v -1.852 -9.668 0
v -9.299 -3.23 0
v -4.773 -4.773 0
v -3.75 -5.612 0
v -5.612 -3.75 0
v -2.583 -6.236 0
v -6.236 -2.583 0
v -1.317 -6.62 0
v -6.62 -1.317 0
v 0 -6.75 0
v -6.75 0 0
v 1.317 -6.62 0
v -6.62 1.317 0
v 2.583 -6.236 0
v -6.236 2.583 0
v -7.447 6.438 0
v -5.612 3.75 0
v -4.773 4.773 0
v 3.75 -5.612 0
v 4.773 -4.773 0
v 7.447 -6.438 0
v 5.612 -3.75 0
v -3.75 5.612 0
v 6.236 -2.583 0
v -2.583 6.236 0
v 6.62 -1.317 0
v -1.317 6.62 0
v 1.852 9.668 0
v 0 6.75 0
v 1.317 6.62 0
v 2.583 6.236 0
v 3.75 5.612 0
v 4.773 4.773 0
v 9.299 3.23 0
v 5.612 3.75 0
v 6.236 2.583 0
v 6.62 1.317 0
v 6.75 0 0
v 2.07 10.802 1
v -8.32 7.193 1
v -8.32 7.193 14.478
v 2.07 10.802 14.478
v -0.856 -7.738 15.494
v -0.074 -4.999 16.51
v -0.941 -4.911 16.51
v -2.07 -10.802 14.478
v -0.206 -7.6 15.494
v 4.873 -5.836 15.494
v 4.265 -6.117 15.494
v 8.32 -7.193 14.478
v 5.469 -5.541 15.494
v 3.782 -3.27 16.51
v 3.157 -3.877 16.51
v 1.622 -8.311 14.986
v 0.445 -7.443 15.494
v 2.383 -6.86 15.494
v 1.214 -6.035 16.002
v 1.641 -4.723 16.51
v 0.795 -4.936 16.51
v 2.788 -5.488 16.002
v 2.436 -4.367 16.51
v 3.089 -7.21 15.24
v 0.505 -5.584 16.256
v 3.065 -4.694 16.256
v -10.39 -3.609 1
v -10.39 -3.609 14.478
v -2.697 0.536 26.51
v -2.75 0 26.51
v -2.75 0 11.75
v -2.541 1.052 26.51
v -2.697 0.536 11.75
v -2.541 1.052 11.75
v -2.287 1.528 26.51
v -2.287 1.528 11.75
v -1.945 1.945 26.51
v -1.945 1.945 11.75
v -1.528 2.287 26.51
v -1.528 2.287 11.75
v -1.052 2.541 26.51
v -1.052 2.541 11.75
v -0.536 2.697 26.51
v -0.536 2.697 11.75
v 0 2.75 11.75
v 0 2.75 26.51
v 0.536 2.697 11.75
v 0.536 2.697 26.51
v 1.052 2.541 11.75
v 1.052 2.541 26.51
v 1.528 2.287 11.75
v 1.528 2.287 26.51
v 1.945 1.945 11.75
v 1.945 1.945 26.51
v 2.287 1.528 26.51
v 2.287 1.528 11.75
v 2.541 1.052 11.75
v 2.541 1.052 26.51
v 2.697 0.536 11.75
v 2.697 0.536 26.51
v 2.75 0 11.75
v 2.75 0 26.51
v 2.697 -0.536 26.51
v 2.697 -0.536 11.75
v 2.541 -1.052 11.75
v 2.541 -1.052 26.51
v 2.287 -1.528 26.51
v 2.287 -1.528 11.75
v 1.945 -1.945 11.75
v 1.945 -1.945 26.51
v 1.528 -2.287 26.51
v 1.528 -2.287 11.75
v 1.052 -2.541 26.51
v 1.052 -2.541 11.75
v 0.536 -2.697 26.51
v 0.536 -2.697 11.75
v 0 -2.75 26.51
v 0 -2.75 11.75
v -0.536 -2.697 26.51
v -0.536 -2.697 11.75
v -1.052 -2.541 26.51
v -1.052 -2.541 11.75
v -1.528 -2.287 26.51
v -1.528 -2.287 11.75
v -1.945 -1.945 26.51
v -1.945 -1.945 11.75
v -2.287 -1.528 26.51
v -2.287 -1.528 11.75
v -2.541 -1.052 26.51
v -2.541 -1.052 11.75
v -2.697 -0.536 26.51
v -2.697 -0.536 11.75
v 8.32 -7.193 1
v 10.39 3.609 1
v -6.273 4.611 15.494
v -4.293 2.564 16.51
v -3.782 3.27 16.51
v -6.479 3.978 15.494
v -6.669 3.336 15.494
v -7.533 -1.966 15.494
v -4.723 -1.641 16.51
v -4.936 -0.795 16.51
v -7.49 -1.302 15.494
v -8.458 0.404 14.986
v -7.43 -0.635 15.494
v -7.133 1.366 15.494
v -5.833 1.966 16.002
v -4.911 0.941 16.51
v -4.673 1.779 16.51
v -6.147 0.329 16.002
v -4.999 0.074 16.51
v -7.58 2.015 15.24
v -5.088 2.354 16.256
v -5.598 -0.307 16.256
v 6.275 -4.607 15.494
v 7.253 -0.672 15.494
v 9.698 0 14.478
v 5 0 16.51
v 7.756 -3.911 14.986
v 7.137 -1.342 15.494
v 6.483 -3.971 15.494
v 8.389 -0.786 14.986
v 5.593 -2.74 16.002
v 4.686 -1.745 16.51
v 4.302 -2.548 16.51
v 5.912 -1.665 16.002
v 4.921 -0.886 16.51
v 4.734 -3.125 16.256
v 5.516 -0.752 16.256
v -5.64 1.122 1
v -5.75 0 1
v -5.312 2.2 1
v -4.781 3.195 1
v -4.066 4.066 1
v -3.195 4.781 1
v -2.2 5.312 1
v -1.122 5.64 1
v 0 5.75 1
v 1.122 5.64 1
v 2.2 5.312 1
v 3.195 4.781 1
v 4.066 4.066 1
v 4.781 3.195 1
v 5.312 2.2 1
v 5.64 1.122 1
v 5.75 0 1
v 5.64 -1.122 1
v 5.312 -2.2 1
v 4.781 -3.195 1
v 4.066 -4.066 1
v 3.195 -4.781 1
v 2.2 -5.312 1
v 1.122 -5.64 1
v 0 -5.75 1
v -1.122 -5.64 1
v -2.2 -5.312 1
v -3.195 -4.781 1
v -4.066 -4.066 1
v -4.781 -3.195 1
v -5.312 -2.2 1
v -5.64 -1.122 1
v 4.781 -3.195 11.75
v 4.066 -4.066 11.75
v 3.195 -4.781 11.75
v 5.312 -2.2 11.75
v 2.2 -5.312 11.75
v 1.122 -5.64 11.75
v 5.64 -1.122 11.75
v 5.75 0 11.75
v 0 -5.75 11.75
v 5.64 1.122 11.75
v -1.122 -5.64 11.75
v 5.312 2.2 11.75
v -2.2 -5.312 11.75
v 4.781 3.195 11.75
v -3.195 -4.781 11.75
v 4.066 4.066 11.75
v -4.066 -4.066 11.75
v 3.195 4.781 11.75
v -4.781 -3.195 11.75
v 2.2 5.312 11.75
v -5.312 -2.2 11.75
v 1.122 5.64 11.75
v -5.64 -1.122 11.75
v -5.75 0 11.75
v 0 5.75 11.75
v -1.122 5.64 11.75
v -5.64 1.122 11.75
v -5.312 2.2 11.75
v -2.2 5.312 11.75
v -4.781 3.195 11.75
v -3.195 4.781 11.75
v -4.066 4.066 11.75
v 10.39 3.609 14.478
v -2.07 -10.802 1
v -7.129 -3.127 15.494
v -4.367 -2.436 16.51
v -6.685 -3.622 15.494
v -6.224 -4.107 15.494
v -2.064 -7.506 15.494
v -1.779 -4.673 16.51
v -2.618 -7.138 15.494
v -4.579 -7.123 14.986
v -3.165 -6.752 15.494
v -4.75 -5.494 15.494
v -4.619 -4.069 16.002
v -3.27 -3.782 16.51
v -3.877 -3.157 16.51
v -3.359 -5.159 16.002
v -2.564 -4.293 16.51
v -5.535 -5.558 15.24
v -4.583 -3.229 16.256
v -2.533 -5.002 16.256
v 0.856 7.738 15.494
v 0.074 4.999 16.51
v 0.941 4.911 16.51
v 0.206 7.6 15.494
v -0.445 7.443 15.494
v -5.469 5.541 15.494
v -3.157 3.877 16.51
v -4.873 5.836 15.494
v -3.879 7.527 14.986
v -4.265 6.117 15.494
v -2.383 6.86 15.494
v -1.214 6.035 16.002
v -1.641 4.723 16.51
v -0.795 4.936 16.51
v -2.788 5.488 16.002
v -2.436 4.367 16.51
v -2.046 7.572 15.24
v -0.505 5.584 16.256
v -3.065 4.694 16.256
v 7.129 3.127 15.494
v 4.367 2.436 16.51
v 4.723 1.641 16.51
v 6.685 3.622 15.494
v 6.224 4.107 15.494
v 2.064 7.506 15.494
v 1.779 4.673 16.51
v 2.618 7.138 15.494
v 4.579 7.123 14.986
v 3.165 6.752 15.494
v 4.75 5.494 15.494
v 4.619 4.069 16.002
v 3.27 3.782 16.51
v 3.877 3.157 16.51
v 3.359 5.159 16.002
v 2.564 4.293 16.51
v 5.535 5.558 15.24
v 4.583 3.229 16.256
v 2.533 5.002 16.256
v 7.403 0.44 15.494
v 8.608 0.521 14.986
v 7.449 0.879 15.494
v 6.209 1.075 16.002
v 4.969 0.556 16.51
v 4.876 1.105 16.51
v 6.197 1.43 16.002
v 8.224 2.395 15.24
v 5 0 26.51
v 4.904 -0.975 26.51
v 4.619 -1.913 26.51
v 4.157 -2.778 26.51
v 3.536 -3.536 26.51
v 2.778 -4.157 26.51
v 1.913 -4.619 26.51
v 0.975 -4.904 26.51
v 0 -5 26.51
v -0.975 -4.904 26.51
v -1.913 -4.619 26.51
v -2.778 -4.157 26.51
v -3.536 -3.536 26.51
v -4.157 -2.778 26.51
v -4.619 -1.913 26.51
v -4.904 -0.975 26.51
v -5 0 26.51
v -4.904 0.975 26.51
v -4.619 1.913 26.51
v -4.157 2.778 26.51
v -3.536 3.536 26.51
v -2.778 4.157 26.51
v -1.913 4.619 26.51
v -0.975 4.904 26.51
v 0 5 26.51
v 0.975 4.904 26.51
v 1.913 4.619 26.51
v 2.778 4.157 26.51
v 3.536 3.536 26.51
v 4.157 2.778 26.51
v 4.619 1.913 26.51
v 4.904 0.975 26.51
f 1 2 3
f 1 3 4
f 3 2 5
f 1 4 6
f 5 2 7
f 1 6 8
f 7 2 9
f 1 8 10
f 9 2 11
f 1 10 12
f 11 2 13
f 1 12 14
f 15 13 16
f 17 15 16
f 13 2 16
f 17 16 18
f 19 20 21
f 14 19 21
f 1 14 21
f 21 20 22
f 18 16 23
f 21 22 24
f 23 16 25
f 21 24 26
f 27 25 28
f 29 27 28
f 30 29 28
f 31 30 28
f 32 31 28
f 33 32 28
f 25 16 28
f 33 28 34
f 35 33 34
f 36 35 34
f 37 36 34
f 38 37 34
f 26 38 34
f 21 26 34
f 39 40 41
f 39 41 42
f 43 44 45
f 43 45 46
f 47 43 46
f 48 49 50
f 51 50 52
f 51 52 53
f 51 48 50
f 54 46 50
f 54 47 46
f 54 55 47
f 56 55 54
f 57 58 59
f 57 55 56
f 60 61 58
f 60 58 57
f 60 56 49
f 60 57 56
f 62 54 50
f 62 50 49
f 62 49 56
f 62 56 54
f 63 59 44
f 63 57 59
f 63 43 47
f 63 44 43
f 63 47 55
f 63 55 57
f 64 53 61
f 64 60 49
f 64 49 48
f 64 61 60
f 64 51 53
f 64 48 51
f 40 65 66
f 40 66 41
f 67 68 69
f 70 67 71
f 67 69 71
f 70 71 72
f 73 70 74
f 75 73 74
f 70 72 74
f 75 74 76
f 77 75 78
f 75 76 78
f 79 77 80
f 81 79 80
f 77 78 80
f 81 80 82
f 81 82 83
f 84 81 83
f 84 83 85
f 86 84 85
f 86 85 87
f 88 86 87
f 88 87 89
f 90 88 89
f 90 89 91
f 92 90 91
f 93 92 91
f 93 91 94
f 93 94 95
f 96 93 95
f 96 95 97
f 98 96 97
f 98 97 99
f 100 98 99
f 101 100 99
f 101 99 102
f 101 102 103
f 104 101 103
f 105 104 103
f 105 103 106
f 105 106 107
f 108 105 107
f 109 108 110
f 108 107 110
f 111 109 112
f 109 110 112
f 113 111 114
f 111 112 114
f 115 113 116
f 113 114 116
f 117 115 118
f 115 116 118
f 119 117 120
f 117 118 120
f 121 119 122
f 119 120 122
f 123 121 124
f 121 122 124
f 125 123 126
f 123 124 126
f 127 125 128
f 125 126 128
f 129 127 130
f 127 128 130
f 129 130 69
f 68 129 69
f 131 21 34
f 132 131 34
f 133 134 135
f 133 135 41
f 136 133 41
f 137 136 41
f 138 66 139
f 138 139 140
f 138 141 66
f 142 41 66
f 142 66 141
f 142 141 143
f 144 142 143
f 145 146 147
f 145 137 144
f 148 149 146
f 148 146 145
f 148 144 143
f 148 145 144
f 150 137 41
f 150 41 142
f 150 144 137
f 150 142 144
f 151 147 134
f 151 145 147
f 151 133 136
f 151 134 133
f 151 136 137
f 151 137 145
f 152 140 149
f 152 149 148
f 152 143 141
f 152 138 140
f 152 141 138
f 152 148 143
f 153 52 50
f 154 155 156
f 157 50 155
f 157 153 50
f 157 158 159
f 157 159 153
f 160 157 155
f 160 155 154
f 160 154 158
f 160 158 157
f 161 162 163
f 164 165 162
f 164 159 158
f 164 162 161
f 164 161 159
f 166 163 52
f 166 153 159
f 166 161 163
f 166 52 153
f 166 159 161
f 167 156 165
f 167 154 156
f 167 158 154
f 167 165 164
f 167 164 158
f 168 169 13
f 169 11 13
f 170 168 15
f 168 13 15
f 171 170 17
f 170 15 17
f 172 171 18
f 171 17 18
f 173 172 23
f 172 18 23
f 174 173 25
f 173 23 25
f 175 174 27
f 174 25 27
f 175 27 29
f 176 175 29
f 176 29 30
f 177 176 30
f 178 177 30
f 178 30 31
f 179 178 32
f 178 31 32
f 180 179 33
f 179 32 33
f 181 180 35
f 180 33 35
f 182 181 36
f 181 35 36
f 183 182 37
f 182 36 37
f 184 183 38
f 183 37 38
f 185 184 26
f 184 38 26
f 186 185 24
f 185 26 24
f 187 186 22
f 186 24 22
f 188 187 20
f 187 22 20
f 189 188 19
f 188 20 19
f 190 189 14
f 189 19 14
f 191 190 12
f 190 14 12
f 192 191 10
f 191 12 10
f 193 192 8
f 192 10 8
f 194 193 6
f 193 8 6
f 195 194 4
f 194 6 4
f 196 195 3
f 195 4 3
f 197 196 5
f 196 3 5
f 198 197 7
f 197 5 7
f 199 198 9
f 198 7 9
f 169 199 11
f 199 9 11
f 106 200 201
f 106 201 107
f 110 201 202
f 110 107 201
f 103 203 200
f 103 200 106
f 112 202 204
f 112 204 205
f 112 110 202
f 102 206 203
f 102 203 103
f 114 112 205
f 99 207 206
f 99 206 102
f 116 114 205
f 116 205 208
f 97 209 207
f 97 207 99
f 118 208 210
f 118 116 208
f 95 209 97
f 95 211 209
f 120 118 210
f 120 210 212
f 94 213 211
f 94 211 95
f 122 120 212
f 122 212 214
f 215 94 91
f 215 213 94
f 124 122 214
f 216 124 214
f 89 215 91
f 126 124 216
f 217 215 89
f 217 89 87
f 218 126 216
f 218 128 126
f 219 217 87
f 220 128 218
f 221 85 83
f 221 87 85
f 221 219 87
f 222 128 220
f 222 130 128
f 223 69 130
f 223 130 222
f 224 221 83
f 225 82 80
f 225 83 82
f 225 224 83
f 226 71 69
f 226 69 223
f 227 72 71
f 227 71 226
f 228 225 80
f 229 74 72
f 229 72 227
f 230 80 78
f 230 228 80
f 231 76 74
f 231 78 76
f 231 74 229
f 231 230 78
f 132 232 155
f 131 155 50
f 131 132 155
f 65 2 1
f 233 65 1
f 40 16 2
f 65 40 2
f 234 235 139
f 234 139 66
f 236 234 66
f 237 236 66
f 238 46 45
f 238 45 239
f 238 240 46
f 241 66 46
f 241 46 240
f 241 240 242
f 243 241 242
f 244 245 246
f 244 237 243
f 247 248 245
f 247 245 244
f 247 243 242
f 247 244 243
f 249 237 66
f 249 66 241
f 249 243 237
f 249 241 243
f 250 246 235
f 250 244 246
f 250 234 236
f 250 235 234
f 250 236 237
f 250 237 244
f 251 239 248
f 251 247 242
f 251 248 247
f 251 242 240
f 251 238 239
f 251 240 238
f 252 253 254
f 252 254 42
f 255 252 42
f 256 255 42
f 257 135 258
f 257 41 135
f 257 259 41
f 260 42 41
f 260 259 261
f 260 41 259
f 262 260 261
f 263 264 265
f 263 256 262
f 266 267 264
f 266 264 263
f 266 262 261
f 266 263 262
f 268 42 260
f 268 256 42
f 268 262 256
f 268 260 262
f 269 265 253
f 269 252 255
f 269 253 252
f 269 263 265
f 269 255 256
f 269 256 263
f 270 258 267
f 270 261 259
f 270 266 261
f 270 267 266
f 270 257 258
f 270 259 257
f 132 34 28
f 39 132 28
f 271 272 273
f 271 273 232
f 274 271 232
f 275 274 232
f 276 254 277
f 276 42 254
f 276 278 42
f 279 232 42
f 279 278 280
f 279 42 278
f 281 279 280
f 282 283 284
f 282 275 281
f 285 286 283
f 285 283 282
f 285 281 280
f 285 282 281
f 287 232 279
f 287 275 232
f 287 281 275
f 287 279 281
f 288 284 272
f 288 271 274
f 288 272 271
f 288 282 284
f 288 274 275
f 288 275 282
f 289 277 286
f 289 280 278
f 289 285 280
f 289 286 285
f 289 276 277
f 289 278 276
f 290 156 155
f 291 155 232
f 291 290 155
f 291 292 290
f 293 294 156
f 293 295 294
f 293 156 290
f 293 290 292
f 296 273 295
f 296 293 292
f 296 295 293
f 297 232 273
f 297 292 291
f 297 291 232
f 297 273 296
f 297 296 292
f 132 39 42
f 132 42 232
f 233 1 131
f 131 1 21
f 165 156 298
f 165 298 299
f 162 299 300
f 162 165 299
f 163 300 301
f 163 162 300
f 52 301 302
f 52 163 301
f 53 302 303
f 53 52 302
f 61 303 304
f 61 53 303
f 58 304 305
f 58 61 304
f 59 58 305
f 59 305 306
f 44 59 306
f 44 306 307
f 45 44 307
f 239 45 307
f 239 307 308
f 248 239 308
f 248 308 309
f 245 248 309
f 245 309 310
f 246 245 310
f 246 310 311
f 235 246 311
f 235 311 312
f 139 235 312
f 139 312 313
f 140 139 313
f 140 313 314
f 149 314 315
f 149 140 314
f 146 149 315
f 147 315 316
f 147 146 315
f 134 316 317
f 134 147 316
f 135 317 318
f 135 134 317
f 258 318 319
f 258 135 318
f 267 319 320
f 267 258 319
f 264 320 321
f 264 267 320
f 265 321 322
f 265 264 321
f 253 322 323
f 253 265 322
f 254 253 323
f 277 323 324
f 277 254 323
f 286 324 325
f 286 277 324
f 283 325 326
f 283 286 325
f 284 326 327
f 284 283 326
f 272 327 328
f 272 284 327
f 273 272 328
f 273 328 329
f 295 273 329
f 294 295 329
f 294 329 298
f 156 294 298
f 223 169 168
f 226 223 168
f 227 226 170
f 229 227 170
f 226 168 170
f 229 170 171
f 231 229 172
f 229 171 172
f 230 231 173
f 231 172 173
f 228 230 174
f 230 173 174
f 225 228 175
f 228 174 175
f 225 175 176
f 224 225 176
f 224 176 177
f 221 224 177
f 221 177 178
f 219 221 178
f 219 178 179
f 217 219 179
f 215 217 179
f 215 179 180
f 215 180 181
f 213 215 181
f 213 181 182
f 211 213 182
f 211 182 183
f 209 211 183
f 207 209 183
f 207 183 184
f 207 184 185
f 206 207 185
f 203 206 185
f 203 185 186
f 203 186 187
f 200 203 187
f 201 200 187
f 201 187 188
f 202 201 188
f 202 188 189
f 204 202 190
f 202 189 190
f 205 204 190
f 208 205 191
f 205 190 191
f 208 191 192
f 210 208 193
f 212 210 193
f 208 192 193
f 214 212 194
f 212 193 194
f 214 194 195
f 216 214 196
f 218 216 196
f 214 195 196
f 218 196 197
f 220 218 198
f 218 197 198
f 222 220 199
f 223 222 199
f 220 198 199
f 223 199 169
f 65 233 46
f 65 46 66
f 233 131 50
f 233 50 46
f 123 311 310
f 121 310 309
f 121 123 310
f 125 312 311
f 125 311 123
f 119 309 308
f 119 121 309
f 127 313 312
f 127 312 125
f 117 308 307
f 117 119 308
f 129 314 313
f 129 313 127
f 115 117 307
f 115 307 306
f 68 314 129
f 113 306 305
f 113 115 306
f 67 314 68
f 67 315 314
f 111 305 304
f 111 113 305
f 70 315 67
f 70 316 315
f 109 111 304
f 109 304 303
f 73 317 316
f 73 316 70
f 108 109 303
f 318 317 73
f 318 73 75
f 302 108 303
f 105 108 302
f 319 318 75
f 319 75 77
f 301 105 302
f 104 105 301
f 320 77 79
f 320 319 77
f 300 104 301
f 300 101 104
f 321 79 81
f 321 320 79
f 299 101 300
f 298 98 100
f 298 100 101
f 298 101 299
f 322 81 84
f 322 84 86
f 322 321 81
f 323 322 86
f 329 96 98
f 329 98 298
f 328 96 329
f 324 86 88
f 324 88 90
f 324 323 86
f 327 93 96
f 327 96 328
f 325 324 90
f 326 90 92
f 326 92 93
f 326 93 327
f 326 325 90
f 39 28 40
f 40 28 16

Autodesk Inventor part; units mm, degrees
ref_plane "YZ Plane" through (0, 0, 0) normal (1, 0, 0) x (0, 1, 0)
ref_plane "XZ Plane" through (0, 0, 0) normal (0, 1, 0) x (-1, 0, 0)
sketch "Sketch1" plane through (0, 0, 0) normal (0, 0, 1) x (1, 0, 0)
  line L0 (2.0695, 10.8021) -> (10.3896, 3.6088)
  line L1 (10.3896, 3.6088) -> (8.3201, -7.1932)
  line L2 (8.3201, -7.1932) -> (-2.0695, -10.8021)
  line L3 (-2.0695, -10.8021) -> (-10.3896, -3.6088)
  line L4 (-10.3896, -3.6088) -> (-8.3201, 7.1932)
  line L5 (-8.3201, 7.1932) -> (2.0695, 10.8021)
  point P0 (0, 0)
  point P1 (0, 0)
  dimension "d0" = 19.05
extrude "Extrusion1" add sketch "Sketch1" along normal blind 14.478
ref_plane "Work Plane1" through (0, 0, 16.51) normal (0, 0, 1) x (1, 0, 0)
sketch "Sketch2" plane through (0, 0, 16.51) normal (0, 0, 1) x (1, 0, 0)
  circle A0 centre (0, 0) radius 5
  dimension "d4" = 10
sketch "Sketch3" plane through (0, 0, 14.478) normal (0, 0, 1) x (1, 0, 0)
  line L0 (10.3896, 3.6088) -> (8.3201, -7.1932) projected
  line L1 (2.0695, 10.8021) -> (10.3896, 3.6088) projected
  line L2 (-8.3201, 7.1932) -> (2.0695, 10.8021) projected
  line L3 (-10.3896, -3.6088) -> (-8.3201, 7.1932) projected
  line L4 (-2.0695, -10.8021) -> (-10.3896, -3.6088) projected
  line L5 (8.3201, -7.1932) -> (-2.0695, -10.8021) projected
loft "Loft1" add profiles "Sketch3", "Sketch2"
extrude "Extrusion2" add sketch "Sketch2" along normal blind 10
sketch "Sketch4" plane through (0, 0, 0) normal (0, 0, -1) x (-1, 0, 0)
  circle A0 centre (0, 0) radius 5.75
  dimension "d11" = 11.5
extrude "Extrusion3" cut sketch "Sketch4" against normal blind 11.75
sketch "Sketch5" plane through (0, 0, 11.75) normal (0, 0, -1) x (-1, 0, 0)
  circle A0 centre (0, 0) radius 2.75
  dimension "d14" = 5.5
extrude "Extrusion4" cut sketch "Sketch5" against normal blind 19
thread "Thread1" size "M10x1.5" class "6g" standard "ANSI Metric M Profile" full length
thread "Thread2" size "M12x1.75" class "6H" standard "ANSI Metric M Profile" full length
chamfer "Chamfer1" distance 1 angle 45 7 edges at (9.3549, -1.7922, 0) (6.2295, 7.2055, 0) (-3.1253, 8.9977, 0) (-9.3549, 1.7922, 0) (-6.2295, -7.2055, 0) (3.1253, -8.9977, 0) (5.75, 0, 0)
properties part number "222P-4-2"
